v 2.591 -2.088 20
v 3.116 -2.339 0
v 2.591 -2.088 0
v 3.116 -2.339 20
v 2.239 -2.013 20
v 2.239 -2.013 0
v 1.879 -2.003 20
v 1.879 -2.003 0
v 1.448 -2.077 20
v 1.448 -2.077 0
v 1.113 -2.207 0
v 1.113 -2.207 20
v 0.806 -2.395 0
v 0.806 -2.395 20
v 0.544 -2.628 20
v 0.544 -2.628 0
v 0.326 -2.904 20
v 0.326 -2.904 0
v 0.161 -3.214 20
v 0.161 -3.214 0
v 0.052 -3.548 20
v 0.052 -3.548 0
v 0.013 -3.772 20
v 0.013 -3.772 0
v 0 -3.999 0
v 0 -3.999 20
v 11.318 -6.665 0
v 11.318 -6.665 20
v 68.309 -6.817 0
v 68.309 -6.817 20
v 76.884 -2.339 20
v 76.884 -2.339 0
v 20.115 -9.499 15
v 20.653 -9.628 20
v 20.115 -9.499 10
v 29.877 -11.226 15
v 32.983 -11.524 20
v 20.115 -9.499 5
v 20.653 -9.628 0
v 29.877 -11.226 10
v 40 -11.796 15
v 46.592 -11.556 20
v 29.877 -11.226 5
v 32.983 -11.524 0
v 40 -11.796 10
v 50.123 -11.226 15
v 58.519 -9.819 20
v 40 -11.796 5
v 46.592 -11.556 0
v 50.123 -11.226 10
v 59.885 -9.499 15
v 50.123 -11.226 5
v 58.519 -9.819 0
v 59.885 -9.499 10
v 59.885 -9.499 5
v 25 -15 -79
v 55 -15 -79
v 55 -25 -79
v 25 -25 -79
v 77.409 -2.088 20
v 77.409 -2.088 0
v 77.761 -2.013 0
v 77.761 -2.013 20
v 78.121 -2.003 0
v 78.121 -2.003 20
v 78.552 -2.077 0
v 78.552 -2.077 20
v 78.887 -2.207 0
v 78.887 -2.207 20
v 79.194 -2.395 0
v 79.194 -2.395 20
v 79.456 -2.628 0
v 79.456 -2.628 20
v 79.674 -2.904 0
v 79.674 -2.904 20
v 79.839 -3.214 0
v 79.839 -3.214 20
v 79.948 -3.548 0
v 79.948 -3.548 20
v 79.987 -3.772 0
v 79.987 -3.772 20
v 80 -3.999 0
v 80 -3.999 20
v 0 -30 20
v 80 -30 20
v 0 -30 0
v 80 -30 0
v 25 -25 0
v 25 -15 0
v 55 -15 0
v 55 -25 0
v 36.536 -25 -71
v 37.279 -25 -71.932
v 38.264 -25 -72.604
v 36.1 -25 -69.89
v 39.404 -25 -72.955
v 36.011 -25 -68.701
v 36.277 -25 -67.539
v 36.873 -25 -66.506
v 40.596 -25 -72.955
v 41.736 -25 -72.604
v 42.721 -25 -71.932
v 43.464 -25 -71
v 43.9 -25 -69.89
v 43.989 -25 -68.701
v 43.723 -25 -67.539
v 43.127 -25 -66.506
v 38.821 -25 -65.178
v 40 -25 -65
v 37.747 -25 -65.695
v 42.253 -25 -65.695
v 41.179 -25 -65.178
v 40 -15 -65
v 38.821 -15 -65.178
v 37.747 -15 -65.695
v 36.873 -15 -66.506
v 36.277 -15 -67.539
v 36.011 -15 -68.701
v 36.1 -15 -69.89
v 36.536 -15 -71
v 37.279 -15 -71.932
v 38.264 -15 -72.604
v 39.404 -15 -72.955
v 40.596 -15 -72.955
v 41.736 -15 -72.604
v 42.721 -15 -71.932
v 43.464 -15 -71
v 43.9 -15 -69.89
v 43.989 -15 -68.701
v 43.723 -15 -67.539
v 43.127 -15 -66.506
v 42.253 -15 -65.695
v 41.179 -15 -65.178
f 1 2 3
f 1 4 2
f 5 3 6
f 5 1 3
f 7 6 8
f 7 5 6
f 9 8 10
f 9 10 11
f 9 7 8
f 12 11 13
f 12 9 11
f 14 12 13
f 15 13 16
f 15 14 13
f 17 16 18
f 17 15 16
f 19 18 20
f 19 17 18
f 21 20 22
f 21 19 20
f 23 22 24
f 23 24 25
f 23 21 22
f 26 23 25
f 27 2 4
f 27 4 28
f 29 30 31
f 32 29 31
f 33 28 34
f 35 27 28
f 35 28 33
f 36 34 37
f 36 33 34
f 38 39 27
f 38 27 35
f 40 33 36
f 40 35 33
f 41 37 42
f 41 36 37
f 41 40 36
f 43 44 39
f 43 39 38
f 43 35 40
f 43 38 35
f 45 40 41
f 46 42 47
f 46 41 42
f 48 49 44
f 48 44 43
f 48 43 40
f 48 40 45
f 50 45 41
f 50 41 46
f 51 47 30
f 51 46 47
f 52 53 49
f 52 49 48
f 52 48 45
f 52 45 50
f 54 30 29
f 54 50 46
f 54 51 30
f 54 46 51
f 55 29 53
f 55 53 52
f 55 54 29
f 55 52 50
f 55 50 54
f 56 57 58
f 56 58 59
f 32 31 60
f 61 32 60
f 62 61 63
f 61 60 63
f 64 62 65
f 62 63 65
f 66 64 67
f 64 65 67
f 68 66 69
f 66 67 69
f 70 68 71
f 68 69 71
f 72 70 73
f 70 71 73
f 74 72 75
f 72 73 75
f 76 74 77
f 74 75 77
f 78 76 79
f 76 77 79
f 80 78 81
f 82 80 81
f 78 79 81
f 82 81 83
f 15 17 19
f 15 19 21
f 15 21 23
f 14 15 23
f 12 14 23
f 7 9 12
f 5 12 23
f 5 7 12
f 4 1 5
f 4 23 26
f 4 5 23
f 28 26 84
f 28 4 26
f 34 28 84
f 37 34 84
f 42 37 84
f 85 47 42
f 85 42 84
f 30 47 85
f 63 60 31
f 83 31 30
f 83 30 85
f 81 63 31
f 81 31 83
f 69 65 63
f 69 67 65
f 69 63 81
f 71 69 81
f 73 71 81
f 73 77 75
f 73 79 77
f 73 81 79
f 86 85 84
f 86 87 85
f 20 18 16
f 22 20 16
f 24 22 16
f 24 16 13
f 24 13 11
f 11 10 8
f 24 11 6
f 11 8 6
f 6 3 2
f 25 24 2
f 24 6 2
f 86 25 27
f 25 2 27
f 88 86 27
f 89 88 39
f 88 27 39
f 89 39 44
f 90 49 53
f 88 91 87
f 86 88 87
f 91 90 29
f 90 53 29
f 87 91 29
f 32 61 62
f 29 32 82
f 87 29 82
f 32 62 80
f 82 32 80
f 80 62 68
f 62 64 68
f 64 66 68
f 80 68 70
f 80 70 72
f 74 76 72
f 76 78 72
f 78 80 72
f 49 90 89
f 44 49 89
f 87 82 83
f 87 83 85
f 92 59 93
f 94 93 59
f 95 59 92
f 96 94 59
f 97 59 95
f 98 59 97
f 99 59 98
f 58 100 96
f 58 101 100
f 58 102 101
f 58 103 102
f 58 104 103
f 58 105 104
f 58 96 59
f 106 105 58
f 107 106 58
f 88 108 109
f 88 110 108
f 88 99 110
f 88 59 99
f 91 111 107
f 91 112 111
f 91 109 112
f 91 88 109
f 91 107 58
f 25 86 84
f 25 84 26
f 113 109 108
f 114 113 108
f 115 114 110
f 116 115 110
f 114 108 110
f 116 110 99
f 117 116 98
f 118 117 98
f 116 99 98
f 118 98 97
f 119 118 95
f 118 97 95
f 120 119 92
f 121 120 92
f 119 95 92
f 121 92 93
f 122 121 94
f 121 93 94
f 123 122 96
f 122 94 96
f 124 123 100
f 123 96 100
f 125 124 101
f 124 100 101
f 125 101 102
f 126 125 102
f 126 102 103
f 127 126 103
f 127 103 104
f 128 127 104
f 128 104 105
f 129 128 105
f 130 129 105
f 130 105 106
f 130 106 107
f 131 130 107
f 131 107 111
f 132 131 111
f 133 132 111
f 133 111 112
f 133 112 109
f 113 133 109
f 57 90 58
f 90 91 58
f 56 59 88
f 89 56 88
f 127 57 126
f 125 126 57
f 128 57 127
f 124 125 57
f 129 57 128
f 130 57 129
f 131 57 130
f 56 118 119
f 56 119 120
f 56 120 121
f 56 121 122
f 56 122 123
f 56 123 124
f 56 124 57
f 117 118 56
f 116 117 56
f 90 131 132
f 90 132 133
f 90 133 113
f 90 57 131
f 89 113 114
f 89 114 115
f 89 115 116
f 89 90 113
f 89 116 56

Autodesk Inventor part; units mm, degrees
ref_plane "YZ Plane" through (0, 0, 0) normal (1, 0, 0) x (0, 1, 0)
ref_plane "XZ Plane" through (0, 0, 0) normal (0, 1, 0) x (-1, 0, 0)
ref_plane "XY Plane" through (0, 0, 0) normal (0, 0, 1) x (1, 0, 0)
sketch "Sketch3" plane through (0, 0, 0) normal (0, 0, 1) x (1, 0, 0)
  line L0 (0, 0) -> (80, 0)
  line L1 (80, 0) -> (80, -30)
  line L2 (80, -30) -> (0, -30)
  line L3 (0, -30) -> (0, 0)
  line L4 (0, 0) -> (14.7083, -12.3417) construction
  line L5 (14.7083, -12.3417) -> (40, -15) construction
  line L6 (40, -15) -> (65.2917, -12.3417) construction
  line L7 (65.2917, -12.3417) -> (80, 0) construction
  spline S0 degree 4 poles (0, 0) (14.7083, -12.3417) (40, -15) (65.2917, -12.3417) (80, 0) knots 1 1 1 1 1 2 2 2 2 2
  point P0 (52.6458, -13.6709)
  dimension "d13" = 80
  dimension "d14" = 30
  dimension "d15" = 15
  dimension "d16" = 40
  dimension "d17" = 50
  dimension "d18" = 50
  dimension "d19" = 6
  dimension "d21" = 6
extrude "Extrusion1" add sketch "Sketch3" along normal blind 20 contours S0 L1 L2 L3
sketch "Sketch4" plane through (0, 0, 0) normal (0, 0, -1) x (-1, 0, 0)
  line L0 (-25, -25) -> (-55, -25)
  line L1 (-55, -25) -> (-55, -15)
  line L2 (-55, -15) -> (-25, -15)
  line L3 (-25, -15) -> (-25, -25)
  line L4 (-40, -25) -> (-40, -15) construction
  line L5 (-80, -30) -> (-80, 0) projected
  line L6 (0, -30) -> (-80, -30) projected
  point P0 (0, 0)
  dimension "d24" = 30
  dimension "d25" = 40
  dimension "d26" = 5
  dimension "d27" = 10
extrude "Extrusion2" add sketch "Sketch4" along normal blind 80
sketch "Sketch7" plane through (25, -15, 0) normal (0, 1, 0) x (1, 0, 0)
  line L0 (0, 55) -> (20, 55)
  line L1 (20, 55) -> (20, 75)
  line L2 (20, 75) -> (0, 75)
  line L3 (0, 75) -> (0, 55)
  line L4 (30, 0) -> (0, 0) projected
  line L5 (30, 0) -> (30, 80) projected
  line L6 (0, 80) -> (30, 80) projected
  line L7 (0, 0) -> (0, 80) projected
  circle A0 centre (10, 65) radius 4
  line L8 (0, 55) -> (0, 55)
  line L9 (0, 0) -> (0, 80) projected
  line L10 (20, 55) -> (30, 55)
  point P0 (-25, 0)
  point P1 (20, 65)
  point P2 (10, 75)
  point P3 (0, 35)
  dimension "d40" = 10
  dimension "d42" = 20
  dimension "d43" = 20
  dimension "d44" = 8
  dimension "d51" = 15
extrude "Extrusion4" add sketch "Sketch7" along normal blind 10 contours L3 L2 L1 L0 | L1 L2 L7 L6 L5 L10 | A0
sketch "Sketch9" plane through (0, 0, -80) normal (0, 0, -1) x (-1, 0, 0)
  line L0 (-55, -25) -> (-55, -5) projected
  line L1 (-55, -25) -> (-25, -25) projected
  line L2 (-25, -25) -> (-25, -5) projected
  line L3 (-55, -5) -> (-25, -5) projected
  point P0 (0, 0)
extrude "Extrusion7" cut sketch "Sketch9" against normal blind 19
sketch "Sketch10" plane through (0, 0, -61) normal (0, 0, -1) x (-1, 0, 0)
  line L0 (-40, -5) -> (-40, -25) construction
  line L1 (-25, -5) -> (-55, -5) projected
  line L2 (-25, -25) -> (-55, -25) projected
  line L3 (-55, -5) -> (-25, -5)
  line L4 (-25, -5) -> (-25, -25)
  line L5 (-25, -25) -> (-55, -25)
  line L6 (-55, -25) -> (-55, -5)
  line L7 (-55, -25) -> (-55, -5) projected
  line L8 (-25, -5) -> (-25, -25) projected
  line L9 (-55, -15) -> (-25, -15)
  line L10 (-25, -15) -> (-25, -25)
  line L11 (-25, -25) -> (-55, -25)
  line L12 (-55, -25) -> (-55, -15)
  point P0 (0, 0)
  dimension "d81" = 10
extrude "Extrusion10" add sketch "Sketch10" along normal blind 18
sketch "Sketch12" plane through (25, -5, 0) normal (0, 1, 0) x (1, 0, 0)
  line L0 (0, 79) -> (0, 55) projected
  line L1 (0, 55) -> (30, 55) projected
  line L2 (30, 55) -> (30, 79) projected
  line L3 (0, 79) -> (30, 79) projected
  line L4 (0, 0) -> (0, 79) projected
  line L5 (30, 0) -> (30, 79) projected
  line L6 (0, 79) -> (30, 79)
  line L7 (30, 79) -> (30, 64)
  line L8 (30, 64) -> (0, 64)
  line L9 (0, 64) -> (0, 79)
  point P0 (-25, 0)
  point P1 (0, 64)
  dimension "d84" = 15
extrude "Extrusion11" cut sketch "Sketch12" against normal blind 15 contours L3 L2 L8 L0
sketch "Sketch13" plane through (25, -20, 0) normal (0, 1, 0) x (1, 0, 0)
  line L0 (30, 79) -> (30, 64) projected
  line L1 (0, 79) -> (30, 79) projected
  line L2 (0, 64) -> (0, 79) projected
  line L3 (30, 64) -> (0, 64) projected
  circle A0 centre (7, 71.5) radius 4
  circle A1 centre (23, 71.5) radius 4
  circle A2 centre (7, 71.5) radius 6
  circle A3 centre (23, 71.5) radius 6
  point P0 (-25, 0)
  point P1 (0, 71.5)
  dimension "d87" = 8
  dimension "d88" = 8
  dimension "d89" = 7.5
  dimension "d90" = 7.5
  dimension "d91" = 7
  dimension "d92" = 7
  dimension "d93" = 2
  dimension "d94" = 2
extrude "Extrusion14" add sketch "Sketch13" along normal blind 15 contours L0 L3 L2 L1 | A0 | A1 | A2 | A3
sketch "Sketch14" plane through (25, -15, 0) normal (0, 1, 0) x (1, 0, 0)
  line L0 (30, 0) -> (30, 79) projected
  line L1 (30, 55) -> (0, 55)
  line L2 (0, 55) -> (0, 39)
  line L3 (0, 39) -> (30, 39)
  line L4 (30, 39) -> (30, 55)
  line L5 (30, 55) -> (0, 55) projected
  point P0 (-25, 0)
  point P1 (30, 39)
  dimension "d101" = 30
  dimension "d102" = 16
extrude "Extrusion15" add sketch "Sketch14" along normal up to surface (10 mm away)
sketch "Sketch15" plane through (25, -5, 0) normal (0, 1, 0) x (1, 0, 0)
  line L0 (30, 79) -> (0, 79) projected
  line L1 (0, 79) -> (0, 39) projected
  point P0 (-25, 0)
  point P1 (15, 69)
  dimension "d105" = 10
  dimension "d106" = 15
hole "Hole1" at (40, -5, -69) direction (0, -1, 0) diameter 8 depth 20
sketch "Sketch16" plane through (25, -5, 0) normal (0, 1, 0) x (1, 0, 0)
  circle A0 centre (15, 69) radius 4 projected
  line L0 (0, 79) -> (0, 39) projected
  line L1 (30, 39) -> (0, 39) projected
  line L2 (30, 79) -> (30, 39) projected
  line L3 (30, 79) -> (0, 79) projected
  point P0 (-25, 0)
extrude "Extrusion16" cut sketch "Sketch16" against normal up to surface (10 mm away)
fillet "Fillet1" radius 2 2 edges at (80, 0, 10) (0, 0, 10)
thread "Thread1" size "M8x1.25" class "6H" standard "ANSI Metric M Profile" full length
properties part number "Part 1 menton" material "ABS Plastic"
